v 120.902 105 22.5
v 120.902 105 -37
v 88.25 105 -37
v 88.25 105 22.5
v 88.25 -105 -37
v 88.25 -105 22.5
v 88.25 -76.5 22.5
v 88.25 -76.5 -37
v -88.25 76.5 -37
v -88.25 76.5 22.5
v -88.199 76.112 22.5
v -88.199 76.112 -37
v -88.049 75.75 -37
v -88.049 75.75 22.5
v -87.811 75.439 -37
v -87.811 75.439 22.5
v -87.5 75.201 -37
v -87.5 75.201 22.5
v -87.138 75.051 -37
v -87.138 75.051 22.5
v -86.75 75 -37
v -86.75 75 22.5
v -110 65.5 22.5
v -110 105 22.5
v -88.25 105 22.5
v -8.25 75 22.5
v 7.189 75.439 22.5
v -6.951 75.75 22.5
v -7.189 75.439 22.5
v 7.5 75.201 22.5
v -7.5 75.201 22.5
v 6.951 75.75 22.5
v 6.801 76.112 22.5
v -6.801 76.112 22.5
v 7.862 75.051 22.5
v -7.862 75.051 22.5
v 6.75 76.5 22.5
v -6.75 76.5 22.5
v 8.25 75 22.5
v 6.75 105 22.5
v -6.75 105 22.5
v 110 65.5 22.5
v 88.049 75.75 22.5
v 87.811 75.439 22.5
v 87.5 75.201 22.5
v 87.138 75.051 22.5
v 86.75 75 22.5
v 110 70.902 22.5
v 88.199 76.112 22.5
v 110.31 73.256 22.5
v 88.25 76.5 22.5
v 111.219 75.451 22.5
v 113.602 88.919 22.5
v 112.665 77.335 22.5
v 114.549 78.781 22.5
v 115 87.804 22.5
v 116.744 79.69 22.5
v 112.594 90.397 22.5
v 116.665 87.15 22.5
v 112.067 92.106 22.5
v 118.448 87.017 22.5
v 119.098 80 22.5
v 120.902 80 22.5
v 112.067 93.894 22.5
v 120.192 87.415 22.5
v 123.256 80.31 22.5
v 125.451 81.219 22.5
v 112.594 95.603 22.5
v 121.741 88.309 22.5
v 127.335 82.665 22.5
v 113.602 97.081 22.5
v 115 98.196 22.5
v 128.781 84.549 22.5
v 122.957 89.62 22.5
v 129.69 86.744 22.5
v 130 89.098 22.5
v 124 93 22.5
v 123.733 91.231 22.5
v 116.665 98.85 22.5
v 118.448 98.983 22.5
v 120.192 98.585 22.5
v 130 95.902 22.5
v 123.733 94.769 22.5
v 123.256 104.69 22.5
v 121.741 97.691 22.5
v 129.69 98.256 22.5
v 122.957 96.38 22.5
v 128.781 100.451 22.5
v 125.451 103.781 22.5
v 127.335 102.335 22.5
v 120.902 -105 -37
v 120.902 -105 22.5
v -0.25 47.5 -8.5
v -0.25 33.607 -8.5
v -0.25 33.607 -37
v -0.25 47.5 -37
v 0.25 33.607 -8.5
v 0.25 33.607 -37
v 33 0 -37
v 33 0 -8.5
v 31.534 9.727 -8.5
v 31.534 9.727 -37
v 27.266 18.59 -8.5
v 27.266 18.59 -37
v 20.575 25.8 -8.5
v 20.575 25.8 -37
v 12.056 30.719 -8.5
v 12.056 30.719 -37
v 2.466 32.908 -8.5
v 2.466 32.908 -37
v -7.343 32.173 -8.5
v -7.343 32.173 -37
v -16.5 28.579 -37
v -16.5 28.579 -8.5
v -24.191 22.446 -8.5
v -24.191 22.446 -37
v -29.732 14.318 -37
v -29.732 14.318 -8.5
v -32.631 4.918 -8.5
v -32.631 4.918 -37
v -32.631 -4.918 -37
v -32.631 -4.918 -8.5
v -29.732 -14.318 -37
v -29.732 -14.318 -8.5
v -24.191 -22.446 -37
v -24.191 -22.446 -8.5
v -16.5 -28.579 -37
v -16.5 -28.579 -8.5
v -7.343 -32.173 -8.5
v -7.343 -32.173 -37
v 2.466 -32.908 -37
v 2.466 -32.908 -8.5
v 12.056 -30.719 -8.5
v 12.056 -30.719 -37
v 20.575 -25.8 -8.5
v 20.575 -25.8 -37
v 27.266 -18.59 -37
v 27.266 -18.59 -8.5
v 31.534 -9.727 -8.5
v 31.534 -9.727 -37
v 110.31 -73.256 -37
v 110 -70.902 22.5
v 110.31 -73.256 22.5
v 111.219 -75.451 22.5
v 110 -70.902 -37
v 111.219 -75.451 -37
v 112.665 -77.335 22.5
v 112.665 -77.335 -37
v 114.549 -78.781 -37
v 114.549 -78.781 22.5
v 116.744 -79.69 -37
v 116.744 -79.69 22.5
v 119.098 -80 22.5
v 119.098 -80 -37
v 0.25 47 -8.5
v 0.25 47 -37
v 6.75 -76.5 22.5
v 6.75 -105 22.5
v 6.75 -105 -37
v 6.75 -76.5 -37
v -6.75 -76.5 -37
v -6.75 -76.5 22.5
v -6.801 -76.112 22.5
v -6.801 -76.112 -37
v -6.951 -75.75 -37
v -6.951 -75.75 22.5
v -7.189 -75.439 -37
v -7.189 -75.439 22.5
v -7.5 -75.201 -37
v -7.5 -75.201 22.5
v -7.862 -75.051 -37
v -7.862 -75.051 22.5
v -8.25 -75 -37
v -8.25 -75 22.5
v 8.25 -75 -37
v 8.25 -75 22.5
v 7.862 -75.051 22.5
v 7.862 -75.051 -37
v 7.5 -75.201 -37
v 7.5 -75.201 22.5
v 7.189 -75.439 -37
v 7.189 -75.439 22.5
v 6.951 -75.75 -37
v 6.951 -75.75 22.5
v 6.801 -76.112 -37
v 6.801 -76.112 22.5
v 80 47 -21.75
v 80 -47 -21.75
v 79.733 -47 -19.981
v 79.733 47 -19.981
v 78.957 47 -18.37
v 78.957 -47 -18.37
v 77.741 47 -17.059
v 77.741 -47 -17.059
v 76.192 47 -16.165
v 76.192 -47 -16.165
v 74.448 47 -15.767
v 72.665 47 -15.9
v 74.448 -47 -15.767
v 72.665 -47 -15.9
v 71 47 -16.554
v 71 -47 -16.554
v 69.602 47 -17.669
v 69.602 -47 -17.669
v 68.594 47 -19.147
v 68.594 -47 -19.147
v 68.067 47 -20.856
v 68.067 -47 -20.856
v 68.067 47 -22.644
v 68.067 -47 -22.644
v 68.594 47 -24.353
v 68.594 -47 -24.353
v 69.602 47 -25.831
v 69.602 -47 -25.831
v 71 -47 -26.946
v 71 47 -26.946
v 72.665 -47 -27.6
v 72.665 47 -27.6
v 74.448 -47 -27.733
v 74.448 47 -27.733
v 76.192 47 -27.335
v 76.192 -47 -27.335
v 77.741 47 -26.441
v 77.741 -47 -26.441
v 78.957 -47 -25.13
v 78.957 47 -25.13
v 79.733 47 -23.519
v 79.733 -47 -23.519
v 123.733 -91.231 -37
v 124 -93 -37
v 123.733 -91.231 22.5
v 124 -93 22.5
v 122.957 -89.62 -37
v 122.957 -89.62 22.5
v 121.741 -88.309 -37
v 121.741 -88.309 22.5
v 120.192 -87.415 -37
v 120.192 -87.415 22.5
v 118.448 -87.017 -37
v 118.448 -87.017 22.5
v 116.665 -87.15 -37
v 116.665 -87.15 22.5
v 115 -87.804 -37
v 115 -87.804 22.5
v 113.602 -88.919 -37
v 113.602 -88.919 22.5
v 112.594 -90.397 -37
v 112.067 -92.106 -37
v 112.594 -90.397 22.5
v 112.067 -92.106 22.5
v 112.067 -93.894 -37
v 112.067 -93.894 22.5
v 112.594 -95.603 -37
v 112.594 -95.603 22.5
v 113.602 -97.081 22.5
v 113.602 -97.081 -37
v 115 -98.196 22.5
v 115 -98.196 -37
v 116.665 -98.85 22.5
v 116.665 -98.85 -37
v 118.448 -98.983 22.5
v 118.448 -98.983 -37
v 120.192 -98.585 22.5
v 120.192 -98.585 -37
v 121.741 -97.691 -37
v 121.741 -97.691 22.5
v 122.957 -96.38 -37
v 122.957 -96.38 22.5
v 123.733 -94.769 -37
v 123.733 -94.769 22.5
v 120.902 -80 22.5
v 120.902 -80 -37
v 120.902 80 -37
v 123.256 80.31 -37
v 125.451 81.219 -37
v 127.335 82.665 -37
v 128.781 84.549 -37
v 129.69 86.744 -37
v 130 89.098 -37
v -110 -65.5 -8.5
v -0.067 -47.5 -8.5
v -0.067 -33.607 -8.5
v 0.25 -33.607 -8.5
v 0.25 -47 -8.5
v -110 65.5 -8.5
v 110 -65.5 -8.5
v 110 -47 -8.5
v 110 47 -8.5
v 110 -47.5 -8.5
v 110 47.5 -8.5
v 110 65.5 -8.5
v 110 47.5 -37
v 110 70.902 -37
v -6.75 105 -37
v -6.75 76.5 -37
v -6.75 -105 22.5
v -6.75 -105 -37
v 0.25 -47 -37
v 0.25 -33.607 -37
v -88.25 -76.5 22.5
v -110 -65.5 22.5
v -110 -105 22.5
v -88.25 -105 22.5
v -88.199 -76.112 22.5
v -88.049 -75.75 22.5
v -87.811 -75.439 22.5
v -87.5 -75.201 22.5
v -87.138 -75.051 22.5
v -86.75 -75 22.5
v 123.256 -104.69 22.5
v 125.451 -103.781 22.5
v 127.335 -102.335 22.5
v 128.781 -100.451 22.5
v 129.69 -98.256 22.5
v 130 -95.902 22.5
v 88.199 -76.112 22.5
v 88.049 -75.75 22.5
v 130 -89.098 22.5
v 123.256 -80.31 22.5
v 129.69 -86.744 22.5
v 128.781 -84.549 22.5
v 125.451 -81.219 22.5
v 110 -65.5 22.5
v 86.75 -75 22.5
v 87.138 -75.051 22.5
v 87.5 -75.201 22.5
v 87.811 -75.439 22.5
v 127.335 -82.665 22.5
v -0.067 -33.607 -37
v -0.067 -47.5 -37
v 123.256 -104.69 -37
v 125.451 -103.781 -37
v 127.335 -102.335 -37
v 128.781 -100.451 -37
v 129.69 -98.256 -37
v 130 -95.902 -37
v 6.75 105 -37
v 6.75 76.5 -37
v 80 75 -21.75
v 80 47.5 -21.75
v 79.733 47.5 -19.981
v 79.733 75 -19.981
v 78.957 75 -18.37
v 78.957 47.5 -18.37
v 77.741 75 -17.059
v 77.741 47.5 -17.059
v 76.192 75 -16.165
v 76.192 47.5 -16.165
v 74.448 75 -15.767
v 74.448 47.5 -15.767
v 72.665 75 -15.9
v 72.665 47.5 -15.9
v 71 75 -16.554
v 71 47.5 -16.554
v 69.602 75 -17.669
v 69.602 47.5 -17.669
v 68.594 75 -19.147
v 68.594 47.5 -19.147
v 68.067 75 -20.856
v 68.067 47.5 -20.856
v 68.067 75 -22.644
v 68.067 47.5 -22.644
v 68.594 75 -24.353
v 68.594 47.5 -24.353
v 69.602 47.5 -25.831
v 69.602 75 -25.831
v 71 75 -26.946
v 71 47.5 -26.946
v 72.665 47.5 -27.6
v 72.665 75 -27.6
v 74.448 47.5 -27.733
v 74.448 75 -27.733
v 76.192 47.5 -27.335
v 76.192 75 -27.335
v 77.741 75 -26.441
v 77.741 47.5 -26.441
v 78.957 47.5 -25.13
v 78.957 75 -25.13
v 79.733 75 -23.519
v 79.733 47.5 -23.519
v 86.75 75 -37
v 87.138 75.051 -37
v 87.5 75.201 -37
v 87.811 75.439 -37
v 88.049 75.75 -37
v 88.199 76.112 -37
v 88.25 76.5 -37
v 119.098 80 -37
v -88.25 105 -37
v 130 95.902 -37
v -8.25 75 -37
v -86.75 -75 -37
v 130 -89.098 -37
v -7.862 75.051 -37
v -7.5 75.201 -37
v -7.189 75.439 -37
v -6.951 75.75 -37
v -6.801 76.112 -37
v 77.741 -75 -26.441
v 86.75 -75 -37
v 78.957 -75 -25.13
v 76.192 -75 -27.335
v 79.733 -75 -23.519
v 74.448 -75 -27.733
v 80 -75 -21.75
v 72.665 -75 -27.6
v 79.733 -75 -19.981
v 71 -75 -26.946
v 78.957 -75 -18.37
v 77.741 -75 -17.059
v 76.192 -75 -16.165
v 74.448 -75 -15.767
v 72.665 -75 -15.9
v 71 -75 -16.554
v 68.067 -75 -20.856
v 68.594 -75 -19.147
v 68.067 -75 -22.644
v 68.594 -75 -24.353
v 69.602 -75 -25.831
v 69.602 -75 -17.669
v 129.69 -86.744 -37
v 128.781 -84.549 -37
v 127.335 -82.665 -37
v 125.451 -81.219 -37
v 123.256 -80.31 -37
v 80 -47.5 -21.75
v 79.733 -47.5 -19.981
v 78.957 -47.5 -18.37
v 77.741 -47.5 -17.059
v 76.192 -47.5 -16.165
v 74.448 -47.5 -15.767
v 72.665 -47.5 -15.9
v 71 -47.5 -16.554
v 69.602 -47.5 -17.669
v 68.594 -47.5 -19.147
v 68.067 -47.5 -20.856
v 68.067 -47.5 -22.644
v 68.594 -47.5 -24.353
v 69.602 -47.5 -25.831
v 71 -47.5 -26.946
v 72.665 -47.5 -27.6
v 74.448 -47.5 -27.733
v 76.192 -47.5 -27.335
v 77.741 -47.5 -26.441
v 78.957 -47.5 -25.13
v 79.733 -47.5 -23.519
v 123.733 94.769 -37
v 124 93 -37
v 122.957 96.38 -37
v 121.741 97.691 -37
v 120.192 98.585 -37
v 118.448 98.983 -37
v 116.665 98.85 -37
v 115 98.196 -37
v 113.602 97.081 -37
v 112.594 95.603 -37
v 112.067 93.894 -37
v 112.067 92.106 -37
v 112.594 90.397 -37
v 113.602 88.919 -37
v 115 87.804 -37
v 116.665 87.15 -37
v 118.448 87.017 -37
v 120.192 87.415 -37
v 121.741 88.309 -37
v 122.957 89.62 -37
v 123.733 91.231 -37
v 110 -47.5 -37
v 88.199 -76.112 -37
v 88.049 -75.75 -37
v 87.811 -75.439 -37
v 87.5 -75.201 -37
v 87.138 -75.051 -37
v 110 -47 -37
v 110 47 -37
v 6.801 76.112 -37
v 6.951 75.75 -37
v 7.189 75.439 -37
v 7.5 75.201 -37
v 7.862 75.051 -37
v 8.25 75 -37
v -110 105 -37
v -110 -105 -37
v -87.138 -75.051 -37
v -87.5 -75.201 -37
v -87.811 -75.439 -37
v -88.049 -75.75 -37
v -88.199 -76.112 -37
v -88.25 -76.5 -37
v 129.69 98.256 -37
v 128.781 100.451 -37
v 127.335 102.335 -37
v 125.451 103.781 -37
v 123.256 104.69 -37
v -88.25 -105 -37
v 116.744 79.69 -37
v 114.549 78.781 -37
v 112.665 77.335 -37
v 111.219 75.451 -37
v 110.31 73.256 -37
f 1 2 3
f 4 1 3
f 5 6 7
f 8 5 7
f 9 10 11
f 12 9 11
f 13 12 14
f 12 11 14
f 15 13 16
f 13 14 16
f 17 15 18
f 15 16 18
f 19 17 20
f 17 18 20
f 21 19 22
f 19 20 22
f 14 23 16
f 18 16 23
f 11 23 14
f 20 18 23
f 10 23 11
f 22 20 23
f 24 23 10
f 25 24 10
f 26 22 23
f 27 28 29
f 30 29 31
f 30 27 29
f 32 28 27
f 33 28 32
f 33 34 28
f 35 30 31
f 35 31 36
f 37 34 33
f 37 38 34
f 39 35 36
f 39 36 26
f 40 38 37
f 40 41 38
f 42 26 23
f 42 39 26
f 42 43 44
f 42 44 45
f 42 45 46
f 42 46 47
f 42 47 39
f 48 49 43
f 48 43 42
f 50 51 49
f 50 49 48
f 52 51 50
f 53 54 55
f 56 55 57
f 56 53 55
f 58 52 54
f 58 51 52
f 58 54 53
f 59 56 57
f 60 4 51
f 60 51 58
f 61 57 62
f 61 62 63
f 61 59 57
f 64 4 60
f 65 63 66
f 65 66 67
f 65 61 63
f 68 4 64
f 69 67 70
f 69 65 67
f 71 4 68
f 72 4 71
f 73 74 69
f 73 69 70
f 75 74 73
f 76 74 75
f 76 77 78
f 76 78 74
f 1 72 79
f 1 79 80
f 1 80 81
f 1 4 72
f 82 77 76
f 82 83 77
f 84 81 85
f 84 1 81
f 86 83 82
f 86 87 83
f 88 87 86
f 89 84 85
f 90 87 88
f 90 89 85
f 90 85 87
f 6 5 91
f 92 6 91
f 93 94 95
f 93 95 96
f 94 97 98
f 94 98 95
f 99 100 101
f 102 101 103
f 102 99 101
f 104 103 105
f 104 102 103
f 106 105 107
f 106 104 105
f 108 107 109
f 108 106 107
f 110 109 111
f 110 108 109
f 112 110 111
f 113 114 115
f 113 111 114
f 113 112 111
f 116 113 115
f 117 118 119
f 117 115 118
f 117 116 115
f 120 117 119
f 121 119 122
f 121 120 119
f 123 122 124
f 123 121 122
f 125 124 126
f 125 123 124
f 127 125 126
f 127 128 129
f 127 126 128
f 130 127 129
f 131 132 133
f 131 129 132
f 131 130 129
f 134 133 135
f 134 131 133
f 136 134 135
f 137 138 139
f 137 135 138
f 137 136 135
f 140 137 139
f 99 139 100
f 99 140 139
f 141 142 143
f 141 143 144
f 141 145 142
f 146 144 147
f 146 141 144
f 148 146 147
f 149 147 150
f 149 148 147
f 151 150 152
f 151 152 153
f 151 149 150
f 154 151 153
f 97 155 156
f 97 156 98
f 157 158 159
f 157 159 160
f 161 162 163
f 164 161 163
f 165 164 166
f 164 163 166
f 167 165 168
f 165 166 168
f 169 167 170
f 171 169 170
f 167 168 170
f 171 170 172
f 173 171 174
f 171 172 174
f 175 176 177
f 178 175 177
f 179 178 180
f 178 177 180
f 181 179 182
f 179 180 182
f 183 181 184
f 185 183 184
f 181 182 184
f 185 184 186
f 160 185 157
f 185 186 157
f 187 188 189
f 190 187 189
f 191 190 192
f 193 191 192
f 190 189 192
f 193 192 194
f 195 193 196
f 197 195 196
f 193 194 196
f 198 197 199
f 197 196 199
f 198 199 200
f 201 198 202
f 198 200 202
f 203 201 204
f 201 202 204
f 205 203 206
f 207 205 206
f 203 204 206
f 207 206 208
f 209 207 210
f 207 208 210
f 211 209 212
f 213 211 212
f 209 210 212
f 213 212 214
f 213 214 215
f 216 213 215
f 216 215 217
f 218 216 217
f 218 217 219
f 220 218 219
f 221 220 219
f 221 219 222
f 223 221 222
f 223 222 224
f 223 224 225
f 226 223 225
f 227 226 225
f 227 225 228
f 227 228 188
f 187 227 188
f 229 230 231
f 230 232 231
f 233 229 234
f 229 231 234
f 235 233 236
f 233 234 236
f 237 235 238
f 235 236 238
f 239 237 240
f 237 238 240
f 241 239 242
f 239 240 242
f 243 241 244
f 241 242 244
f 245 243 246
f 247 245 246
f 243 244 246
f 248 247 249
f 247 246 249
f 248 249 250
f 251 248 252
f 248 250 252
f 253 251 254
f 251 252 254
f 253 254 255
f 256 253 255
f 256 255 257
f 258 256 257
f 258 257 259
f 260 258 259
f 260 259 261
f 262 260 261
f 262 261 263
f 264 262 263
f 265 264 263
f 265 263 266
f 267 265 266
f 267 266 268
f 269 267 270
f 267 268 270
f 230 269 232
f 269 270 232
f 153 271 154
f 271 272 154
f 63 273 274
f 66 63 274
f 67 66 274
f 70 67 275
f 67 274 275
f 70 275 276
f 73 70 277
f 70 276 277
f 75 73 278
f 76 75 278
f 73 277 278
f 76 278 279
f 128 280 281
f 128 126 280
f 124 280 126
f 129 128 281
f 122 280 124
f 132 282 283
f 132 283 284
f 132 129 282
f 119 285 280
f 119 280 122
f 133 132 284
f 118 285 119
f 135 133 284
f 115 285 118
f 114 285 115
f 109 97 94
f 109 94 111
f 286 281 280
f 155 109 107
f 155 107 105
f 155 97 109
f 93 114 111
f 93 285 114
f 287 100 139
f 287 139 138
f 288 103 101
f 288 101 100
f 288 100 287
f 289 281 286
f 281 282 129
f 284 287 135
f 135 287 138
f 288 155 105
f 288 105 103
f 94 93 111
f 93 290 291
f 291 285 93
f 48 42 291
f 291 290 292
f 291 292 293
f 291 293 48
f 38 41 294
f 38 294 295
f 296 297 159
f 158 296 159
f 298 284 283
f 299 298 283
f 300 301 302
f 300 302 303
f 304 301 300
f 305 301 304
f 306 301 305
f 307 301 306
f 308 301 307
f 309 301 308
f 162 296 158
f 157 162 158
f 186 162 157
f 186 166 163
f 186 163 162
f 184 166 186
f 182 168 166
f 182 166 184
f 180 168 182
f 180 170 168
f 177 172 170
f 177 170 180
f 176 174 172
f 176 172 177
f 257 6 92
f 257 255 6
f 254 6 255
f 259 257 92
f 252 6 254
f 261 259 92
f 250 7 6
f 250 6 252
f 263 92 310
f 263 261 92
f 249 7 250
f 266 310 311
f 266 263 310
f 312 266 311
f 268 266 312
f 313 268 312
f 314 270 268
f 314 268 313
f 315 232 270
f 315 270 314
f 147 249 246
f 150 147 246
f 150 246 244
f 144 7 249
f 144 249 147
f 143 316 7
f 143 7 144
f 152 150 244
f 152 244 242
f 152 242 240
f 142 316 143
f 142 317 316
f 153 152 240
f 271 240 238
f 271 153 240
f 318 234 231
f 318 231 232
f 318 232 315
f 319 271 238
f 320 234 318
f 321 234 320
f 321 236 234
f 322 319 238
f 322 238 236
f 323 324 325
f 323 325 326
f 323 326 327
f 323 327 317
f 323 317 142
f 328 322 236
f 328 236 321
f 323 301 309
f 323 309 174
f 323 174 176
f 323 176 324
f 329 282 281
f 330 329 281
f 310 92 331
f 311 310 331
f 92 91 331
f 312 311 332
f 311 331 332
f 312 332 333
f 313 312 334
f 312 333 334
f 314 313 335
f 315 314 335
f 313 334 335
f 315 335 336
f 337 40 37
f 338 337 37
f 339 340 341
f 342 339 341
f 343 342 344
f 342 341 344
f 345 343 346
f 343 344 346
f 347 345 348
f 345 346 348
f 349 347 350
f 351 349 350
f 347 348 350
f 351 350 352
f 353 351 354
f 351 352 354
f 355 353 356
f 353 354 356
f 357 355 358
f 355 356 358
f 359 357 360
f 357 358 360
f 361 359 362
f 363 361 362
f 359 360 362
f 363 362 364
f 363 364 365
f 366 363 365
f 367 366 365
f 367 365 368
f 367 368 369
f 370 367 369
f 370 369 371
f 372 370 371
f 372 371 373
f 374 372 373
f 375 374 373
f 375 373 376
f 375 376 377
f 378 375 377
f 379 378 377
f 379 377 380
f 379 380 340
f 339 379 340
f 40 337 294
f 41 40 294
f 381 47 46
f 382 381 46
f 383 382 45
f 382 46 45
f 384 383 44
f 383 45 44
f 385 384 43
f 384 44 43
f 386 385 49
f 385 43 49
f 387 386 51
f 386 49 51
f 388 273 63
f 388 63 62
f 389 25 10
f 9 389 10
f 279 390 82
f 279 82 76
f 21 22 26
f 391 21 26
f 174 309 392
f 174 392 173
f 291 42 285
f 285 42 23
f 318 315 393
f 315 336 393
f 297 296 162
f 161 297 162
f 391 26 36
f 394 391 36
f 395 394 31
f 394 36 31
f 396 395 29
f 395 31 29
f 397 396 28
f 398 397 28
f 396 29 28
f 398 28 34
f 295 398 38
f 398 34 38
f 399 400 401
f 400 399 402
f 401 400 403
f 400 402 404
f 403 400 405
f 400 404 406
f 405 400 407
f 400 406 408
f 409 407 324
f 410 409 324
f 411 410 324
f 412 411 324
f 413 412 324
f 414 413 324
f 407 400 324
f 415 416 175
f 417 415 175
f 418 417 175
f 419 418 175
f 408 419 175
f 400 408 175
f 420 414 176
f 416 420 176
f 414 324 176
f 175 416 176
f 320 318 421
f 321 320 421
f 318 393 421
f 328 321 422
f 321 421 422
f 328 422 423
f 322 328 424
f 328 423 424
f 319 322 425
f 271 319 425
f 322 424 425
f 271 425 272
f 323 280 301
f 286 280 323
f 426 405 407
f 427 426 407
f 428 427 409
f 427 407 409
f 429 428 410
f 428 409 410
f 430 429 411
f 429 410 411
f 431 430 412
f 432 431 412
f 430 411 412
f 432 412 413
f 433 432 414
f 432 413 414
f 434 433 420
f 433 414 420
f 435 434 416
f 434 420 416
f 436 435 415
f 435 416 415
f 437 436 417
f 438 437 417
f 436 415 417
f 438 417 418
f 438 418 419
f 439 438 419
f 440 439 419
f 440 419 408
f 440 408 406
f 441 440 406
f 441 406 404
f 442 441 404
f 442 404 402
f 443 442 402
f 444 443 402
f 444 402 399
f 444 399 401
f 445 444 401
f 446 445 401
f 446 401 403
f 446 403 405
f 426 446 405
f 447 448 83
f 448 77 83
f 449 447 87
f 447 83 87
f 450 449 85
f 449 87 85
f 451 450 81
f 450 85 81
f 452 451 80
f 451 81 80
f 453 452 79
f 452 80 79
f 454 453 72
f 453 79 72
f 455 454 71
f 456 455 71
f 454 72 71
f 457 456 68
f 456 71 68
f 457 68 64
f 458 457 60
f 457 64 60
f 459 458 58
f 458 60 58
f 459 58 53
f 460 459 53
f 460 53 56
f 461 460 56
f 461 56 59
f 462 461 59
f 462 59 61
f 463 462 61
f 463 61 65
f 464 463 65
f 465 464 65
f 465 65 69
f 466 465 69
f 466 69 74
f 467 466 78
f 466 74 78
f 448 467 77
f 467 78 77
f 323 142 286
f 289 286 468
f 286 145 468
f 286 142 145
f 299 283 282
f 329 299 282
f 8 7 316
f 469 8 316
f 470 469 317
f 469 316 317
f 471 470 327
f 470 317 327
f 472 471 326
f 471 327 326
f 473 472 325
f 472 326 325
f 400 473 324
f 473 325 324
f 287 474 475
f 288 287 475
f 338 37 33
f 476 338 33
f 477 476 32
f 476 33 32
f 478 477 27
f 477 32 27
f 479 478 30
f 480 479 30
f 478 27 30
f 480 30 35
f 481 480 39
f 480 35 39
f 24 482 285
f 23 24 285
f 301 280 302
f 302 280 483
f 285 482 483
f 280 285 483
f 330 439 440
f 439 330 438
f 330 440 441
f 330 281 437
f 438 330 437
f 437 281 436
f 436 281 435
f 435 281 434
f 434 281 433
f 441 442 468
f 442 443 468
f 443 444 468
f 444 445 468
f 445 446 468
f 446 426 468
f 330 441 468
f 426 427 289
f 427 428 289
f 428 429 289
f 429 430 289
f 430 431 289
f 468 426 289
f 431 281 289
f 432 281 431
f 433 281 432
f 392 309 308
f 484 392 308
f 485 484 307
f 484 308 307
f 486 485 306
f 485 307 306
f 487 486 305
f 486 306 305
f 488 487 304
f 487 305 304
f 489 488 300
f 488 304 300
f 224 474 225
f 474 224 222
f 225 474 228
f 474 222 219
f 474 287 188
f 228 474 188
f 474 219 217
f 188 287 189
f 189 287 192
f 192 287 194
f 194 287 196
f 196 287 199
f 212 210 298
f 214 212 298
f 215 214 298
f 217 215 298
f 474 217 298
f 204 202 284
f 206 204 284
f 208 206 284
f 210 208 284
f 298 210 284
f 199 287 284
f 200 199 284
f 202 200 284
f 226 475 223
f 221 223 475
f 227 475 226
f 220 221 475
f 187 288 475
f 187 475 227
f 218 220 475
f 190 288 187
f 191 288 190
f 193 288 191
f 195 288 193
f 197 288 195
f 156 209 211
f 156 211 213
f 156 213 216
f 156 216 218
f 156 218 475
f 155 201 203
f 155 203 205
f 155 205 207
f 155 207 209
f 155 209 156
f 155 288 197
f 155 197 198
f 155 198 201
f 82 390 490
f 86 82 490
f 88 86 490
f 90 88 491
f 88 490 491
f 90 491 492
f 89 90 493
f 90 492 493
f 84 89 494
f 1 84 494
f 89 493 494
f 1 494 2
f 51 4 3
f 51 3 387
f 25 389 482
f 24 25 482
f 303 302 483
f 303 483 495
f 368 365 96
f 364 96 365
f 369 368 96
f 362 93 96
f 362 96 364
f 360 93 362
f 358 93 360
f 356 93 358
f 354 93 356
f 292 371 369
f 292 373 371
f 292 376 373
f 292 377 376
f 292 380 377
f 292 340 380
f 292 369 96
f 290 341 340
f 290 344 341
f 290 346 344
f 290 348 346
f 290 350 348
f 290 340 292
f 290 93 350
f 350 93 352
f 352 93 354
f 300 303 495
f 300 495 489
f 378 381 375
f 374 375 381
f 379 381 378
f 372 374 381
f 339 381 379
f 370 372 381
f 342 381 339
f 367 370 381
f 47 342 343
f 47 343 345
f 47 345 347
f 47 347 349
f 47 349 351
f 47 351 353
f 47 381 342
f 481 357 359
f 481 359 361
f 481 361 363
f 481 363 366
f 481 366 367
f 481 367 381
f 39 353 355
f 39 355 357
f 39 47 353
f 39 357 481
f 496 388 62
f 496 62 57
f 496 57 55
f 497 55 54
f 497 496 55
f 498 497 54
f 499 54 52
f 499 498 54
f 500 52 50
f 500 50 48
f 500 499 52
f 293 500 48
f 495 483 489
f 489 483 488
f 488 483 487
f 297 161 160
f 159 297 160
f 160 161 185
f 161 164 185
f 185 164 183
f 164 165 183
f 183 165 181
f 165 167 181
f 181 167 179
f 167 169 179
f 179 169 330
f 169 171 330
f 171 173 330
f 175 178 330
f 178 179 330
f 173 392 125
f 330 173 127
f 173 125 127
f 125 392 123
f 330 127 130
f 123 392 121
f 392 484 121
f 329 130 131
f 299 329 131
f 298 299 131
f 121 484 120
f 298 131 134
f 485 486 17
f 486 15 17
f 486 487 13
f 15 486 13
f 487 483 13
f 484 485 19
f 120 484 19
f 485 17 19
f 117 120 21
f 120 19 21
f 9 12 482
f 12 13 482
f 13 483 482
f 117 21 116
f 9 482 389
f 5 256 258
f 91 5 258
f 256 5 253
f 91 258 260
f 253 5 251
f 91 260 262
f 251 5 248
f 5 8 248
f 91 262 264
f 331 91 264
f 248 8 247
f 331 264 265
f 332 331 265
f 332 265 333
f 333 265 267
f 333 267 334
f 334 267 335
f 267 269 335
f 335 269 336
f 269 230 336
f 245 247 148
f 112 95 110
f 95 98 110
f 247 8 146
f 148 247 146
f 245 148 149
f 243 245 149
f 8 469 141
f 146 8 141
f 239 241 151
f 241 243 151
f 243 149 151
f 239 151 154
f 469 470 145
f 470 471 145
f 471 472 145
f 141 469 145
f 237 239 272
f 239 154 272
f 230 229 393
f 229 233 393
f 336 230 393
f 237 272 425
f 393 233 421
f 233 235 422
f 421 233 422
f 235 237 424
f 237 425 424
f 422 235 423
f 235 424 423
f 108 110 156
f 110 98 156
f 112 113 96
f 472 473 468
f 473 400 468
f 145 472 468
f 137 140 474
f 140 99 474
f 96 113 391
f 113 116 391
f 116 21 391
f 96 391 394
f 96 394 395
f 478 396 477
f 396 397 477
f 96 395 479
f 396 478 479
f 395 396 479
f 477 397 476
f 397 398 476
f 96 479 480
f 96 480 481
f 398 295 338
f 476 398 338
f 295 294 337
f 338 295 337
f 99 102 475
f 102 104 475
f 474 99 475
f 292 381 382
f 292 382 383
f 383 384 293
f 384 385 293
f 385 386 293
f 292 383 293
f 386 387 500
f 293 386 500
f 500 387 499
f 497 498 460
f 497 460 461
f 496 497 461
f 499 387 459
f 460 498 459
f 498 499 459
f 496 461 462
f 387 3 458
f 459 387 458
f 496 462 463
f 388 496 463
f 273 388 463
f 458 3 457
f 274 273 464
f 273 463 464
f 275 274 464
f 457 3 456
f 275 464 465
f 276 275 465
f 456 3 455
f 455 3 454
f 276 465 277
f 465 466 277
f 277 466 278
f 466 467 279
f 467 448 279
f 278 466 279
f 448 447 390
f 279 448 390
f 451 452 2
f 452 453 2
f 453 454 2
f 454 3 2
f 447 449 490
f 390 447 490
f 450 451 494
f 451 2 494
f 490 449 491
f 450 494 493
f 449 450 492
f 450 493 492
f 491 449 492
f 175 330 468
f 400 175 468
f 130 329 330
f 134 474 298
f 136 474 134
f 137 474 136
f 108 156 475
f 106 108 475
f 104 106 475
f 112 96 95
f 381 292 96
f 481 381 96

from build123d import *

# Parameters (mm, degrees)
SKETCH021_R          = 33
PAD017_DEPTH         = 37
PAD017_DEPTH_BACK    = 22.5
POCKET017_DEPTH      = 8.5
POCKET017_DEPTH_BACK = 13
SKETCH_2_R           = 6
POCKET018_DEPTH      = 50
POCKET018_DEPTH_BACK = 50
SKETCH028_R          = 6
POCKET019_DEPTH      = 180.001
POCKET020_START      = 10.5
SKETCH034_W          = 315.852005
SKETCH034_H          = 131
POCKET020_DEPTH      = 14.5


with BuildPart() as part:
    # Sketch021 → Pad017 (new body, two sides)
    with BuildSketch(Plane.XY) as pad017_sk:
        with BuildLine():
            Line((-110, -105), (110, -105))
            Line((110, -105), (120.90162, -105))
            ThreePointArc((120.90162, -105), (127.335146, -102.335146), (130, -95.90162))
            Line((130, -95.90162), (130, -89.09838))
            ThreePointArc((130, -89.09838), (127.335146, -82.664854), (120.90162, -80))
            Line((120.90162, -80), (119.09838, -80))
            ThreePointArc((110, -70.90162), (112.664854, -77.335146), (119.09838, -80))
            Line((110, -70.90162), (110, 0))
            Line((110, 70.90162), (110, 0))
            ThreePointArc((119.09838, 80), (112.664854, 77.335146), (110, 70.90162))
            Line((120.90162, 80), (119.09838, 80))
            ThreePointArc((120.90162, 80), (127.335146, 82.664854), (130, 89.09838))
            Line((130, 95.90162), (130, 89.09838))
            ThreePointArc((130, 95.90162), (127.335146, 102.335146), (120.90162, 105))
            Line((110, 105), (120.90162, 105))
            Line((110, 105), (-110, 105))
            Line((-110, 105), (-110, 0))
            Line((-110, -105), (-110, 0))
        make_face()
        Circle(SKETCH021_R, mode=Mode.SUBTRACT)
    extrude(amount=-PAD017_DEPTH)
    extrude(pad017_sk.sketch, amount=PAD017_DEPTH_BACK)

    # Sketch_1 → Pocket017 (cut, two sides)
    with BuildSketch(Plane.XY) as pocket017_sk:
        Polygon((145.597992, 65.5), (0, 65.5), (-153.015656, 65.5), (-153.015656, -65.5), (0, -65.5), (145.597992, -65.5), align=None)
    extrude(amount=-POCKET017_DEPTH, mode=Mode.SUBTRACT)
    extrude(pocket017_sk.sketch, amount=POCKET017_DEPTH_BACK, mode=Mode.SUBTRACT)

    # Sketch_2 → Pocket018 (cut, two sides)
    with BuildSketch(Plane.XY) as pocket018_sk:
        with Locations((-118, 93)):
            Circle(SKETCH_2_R)
        with Locations((118, 93)):
            Circle(SKETCH_2_R)
        with Locations((-118, -93)):
            Circle(SKETCH_2_R)
        with Locations((118, -93)):
            Circle(SKETCH_2_R)
        Polygon((-0.25, 33.607407), (-0.25, 47.5), (126.736248, 47.5), (126.736248, 47), (0.25, 47), (0.25, 33.607407), align=None)
        with BuildLine():
            ThreePointArc((86.75, 75), (87.81066, 75.43934), (88.25, 76.5))
            Line((88.25, 105), (88.25, 76.5))
            Line((88.25, 105), (6.75, 105))
            Line((6.75, 105), (6.75, 76.5))
            ThreePointArc((6.75, 76.5), (7.18934, 75.43934), (8.25, 75))
            Line((86.75, 75), (8.25, 75))
        make_face()
        Polygon((-0.067348, -33.607407), (-0.067348, -47.5), (126.736248, -47.5), (126.736248, -47), (0.25, -47), (0.25, -33.607407), align=None)
        with BuildLine():
            ThreePointArc((-88.25, 76.5), (-87.81066, 75.43934), (-86.75, 75))
            Line((-86.75, 75), (-8.25, 75))
            ThreePointArc((-8.25, 75), (-7.18934, 75.43934), (-6.75, 76.5))
            Line((-6.75, 105), (-6.75, 76.5))
            Line((-88.25, 105), (-6.75, 105))
            Line((-88.25, 105), (-88.25, 76.5))
        make_face()
        with BuildLine():
            ThreePointArc((88.25, -76.5), (87.81066, -75.43934), (86.75, -75))
            Line((86.75, -75), (8.25, -75))
            ThreePointArc((8.25, -75), (7.18934, -75.43934), (6.75, -76.5))
            Line((6.75, -105), (6.75, -76.5))
            Line((88.25, -105), (6.75, -105))
            Line((88.25, -105), (88.25, -76.5))
        make_face()
        with BuildLine():
            ThreePointArc((-86.75, -75), (-87.81066, -75.43934), (-88.25, -76.5))
            Line((-88.25, -105), (-88.25, -76.5))
            Line((-88.25, -105), (-6.75, -105))
            Line((-6.75, -105), (-6.75, -76.5))
            ThreePointArc((-6.75, -76.5), (-7.18934, -75.43934), (-8.25, -75))
            Line((-86.75, -75), (-8.25, -75))
        make_face()
    extrude(amount=-POCKET018_DEPTH, mode=Mode.SUBTRACT)
    extrude(pocket018_sk.sketch, amount=POCKET018_DEPTH_BACK, mode=Mode.SUBTRACT)

    # Sketch028 → Pocket019 (cut, through all)
    with BuildSketch(Plane.XZ.offset(75)):
        with Locations((74, -21.75)):
            Circle(SKETCH028_R)
    extrude(amount=-POCKET019_DEPTH, mode=Mode.SUBTRACT)

    # Sketch034 → Pocket020 (cut)
    with BuildSketch(Plane.XY.offset(POCKET020_START)):
        with Locations((3.702202, 0)):
            Rectangle(SKETCH034_W, SKETCH034_H)
    extrude(amount=POCKET020_DEPTH, mode=Mode.SUBTRACT)


solid = part.part
